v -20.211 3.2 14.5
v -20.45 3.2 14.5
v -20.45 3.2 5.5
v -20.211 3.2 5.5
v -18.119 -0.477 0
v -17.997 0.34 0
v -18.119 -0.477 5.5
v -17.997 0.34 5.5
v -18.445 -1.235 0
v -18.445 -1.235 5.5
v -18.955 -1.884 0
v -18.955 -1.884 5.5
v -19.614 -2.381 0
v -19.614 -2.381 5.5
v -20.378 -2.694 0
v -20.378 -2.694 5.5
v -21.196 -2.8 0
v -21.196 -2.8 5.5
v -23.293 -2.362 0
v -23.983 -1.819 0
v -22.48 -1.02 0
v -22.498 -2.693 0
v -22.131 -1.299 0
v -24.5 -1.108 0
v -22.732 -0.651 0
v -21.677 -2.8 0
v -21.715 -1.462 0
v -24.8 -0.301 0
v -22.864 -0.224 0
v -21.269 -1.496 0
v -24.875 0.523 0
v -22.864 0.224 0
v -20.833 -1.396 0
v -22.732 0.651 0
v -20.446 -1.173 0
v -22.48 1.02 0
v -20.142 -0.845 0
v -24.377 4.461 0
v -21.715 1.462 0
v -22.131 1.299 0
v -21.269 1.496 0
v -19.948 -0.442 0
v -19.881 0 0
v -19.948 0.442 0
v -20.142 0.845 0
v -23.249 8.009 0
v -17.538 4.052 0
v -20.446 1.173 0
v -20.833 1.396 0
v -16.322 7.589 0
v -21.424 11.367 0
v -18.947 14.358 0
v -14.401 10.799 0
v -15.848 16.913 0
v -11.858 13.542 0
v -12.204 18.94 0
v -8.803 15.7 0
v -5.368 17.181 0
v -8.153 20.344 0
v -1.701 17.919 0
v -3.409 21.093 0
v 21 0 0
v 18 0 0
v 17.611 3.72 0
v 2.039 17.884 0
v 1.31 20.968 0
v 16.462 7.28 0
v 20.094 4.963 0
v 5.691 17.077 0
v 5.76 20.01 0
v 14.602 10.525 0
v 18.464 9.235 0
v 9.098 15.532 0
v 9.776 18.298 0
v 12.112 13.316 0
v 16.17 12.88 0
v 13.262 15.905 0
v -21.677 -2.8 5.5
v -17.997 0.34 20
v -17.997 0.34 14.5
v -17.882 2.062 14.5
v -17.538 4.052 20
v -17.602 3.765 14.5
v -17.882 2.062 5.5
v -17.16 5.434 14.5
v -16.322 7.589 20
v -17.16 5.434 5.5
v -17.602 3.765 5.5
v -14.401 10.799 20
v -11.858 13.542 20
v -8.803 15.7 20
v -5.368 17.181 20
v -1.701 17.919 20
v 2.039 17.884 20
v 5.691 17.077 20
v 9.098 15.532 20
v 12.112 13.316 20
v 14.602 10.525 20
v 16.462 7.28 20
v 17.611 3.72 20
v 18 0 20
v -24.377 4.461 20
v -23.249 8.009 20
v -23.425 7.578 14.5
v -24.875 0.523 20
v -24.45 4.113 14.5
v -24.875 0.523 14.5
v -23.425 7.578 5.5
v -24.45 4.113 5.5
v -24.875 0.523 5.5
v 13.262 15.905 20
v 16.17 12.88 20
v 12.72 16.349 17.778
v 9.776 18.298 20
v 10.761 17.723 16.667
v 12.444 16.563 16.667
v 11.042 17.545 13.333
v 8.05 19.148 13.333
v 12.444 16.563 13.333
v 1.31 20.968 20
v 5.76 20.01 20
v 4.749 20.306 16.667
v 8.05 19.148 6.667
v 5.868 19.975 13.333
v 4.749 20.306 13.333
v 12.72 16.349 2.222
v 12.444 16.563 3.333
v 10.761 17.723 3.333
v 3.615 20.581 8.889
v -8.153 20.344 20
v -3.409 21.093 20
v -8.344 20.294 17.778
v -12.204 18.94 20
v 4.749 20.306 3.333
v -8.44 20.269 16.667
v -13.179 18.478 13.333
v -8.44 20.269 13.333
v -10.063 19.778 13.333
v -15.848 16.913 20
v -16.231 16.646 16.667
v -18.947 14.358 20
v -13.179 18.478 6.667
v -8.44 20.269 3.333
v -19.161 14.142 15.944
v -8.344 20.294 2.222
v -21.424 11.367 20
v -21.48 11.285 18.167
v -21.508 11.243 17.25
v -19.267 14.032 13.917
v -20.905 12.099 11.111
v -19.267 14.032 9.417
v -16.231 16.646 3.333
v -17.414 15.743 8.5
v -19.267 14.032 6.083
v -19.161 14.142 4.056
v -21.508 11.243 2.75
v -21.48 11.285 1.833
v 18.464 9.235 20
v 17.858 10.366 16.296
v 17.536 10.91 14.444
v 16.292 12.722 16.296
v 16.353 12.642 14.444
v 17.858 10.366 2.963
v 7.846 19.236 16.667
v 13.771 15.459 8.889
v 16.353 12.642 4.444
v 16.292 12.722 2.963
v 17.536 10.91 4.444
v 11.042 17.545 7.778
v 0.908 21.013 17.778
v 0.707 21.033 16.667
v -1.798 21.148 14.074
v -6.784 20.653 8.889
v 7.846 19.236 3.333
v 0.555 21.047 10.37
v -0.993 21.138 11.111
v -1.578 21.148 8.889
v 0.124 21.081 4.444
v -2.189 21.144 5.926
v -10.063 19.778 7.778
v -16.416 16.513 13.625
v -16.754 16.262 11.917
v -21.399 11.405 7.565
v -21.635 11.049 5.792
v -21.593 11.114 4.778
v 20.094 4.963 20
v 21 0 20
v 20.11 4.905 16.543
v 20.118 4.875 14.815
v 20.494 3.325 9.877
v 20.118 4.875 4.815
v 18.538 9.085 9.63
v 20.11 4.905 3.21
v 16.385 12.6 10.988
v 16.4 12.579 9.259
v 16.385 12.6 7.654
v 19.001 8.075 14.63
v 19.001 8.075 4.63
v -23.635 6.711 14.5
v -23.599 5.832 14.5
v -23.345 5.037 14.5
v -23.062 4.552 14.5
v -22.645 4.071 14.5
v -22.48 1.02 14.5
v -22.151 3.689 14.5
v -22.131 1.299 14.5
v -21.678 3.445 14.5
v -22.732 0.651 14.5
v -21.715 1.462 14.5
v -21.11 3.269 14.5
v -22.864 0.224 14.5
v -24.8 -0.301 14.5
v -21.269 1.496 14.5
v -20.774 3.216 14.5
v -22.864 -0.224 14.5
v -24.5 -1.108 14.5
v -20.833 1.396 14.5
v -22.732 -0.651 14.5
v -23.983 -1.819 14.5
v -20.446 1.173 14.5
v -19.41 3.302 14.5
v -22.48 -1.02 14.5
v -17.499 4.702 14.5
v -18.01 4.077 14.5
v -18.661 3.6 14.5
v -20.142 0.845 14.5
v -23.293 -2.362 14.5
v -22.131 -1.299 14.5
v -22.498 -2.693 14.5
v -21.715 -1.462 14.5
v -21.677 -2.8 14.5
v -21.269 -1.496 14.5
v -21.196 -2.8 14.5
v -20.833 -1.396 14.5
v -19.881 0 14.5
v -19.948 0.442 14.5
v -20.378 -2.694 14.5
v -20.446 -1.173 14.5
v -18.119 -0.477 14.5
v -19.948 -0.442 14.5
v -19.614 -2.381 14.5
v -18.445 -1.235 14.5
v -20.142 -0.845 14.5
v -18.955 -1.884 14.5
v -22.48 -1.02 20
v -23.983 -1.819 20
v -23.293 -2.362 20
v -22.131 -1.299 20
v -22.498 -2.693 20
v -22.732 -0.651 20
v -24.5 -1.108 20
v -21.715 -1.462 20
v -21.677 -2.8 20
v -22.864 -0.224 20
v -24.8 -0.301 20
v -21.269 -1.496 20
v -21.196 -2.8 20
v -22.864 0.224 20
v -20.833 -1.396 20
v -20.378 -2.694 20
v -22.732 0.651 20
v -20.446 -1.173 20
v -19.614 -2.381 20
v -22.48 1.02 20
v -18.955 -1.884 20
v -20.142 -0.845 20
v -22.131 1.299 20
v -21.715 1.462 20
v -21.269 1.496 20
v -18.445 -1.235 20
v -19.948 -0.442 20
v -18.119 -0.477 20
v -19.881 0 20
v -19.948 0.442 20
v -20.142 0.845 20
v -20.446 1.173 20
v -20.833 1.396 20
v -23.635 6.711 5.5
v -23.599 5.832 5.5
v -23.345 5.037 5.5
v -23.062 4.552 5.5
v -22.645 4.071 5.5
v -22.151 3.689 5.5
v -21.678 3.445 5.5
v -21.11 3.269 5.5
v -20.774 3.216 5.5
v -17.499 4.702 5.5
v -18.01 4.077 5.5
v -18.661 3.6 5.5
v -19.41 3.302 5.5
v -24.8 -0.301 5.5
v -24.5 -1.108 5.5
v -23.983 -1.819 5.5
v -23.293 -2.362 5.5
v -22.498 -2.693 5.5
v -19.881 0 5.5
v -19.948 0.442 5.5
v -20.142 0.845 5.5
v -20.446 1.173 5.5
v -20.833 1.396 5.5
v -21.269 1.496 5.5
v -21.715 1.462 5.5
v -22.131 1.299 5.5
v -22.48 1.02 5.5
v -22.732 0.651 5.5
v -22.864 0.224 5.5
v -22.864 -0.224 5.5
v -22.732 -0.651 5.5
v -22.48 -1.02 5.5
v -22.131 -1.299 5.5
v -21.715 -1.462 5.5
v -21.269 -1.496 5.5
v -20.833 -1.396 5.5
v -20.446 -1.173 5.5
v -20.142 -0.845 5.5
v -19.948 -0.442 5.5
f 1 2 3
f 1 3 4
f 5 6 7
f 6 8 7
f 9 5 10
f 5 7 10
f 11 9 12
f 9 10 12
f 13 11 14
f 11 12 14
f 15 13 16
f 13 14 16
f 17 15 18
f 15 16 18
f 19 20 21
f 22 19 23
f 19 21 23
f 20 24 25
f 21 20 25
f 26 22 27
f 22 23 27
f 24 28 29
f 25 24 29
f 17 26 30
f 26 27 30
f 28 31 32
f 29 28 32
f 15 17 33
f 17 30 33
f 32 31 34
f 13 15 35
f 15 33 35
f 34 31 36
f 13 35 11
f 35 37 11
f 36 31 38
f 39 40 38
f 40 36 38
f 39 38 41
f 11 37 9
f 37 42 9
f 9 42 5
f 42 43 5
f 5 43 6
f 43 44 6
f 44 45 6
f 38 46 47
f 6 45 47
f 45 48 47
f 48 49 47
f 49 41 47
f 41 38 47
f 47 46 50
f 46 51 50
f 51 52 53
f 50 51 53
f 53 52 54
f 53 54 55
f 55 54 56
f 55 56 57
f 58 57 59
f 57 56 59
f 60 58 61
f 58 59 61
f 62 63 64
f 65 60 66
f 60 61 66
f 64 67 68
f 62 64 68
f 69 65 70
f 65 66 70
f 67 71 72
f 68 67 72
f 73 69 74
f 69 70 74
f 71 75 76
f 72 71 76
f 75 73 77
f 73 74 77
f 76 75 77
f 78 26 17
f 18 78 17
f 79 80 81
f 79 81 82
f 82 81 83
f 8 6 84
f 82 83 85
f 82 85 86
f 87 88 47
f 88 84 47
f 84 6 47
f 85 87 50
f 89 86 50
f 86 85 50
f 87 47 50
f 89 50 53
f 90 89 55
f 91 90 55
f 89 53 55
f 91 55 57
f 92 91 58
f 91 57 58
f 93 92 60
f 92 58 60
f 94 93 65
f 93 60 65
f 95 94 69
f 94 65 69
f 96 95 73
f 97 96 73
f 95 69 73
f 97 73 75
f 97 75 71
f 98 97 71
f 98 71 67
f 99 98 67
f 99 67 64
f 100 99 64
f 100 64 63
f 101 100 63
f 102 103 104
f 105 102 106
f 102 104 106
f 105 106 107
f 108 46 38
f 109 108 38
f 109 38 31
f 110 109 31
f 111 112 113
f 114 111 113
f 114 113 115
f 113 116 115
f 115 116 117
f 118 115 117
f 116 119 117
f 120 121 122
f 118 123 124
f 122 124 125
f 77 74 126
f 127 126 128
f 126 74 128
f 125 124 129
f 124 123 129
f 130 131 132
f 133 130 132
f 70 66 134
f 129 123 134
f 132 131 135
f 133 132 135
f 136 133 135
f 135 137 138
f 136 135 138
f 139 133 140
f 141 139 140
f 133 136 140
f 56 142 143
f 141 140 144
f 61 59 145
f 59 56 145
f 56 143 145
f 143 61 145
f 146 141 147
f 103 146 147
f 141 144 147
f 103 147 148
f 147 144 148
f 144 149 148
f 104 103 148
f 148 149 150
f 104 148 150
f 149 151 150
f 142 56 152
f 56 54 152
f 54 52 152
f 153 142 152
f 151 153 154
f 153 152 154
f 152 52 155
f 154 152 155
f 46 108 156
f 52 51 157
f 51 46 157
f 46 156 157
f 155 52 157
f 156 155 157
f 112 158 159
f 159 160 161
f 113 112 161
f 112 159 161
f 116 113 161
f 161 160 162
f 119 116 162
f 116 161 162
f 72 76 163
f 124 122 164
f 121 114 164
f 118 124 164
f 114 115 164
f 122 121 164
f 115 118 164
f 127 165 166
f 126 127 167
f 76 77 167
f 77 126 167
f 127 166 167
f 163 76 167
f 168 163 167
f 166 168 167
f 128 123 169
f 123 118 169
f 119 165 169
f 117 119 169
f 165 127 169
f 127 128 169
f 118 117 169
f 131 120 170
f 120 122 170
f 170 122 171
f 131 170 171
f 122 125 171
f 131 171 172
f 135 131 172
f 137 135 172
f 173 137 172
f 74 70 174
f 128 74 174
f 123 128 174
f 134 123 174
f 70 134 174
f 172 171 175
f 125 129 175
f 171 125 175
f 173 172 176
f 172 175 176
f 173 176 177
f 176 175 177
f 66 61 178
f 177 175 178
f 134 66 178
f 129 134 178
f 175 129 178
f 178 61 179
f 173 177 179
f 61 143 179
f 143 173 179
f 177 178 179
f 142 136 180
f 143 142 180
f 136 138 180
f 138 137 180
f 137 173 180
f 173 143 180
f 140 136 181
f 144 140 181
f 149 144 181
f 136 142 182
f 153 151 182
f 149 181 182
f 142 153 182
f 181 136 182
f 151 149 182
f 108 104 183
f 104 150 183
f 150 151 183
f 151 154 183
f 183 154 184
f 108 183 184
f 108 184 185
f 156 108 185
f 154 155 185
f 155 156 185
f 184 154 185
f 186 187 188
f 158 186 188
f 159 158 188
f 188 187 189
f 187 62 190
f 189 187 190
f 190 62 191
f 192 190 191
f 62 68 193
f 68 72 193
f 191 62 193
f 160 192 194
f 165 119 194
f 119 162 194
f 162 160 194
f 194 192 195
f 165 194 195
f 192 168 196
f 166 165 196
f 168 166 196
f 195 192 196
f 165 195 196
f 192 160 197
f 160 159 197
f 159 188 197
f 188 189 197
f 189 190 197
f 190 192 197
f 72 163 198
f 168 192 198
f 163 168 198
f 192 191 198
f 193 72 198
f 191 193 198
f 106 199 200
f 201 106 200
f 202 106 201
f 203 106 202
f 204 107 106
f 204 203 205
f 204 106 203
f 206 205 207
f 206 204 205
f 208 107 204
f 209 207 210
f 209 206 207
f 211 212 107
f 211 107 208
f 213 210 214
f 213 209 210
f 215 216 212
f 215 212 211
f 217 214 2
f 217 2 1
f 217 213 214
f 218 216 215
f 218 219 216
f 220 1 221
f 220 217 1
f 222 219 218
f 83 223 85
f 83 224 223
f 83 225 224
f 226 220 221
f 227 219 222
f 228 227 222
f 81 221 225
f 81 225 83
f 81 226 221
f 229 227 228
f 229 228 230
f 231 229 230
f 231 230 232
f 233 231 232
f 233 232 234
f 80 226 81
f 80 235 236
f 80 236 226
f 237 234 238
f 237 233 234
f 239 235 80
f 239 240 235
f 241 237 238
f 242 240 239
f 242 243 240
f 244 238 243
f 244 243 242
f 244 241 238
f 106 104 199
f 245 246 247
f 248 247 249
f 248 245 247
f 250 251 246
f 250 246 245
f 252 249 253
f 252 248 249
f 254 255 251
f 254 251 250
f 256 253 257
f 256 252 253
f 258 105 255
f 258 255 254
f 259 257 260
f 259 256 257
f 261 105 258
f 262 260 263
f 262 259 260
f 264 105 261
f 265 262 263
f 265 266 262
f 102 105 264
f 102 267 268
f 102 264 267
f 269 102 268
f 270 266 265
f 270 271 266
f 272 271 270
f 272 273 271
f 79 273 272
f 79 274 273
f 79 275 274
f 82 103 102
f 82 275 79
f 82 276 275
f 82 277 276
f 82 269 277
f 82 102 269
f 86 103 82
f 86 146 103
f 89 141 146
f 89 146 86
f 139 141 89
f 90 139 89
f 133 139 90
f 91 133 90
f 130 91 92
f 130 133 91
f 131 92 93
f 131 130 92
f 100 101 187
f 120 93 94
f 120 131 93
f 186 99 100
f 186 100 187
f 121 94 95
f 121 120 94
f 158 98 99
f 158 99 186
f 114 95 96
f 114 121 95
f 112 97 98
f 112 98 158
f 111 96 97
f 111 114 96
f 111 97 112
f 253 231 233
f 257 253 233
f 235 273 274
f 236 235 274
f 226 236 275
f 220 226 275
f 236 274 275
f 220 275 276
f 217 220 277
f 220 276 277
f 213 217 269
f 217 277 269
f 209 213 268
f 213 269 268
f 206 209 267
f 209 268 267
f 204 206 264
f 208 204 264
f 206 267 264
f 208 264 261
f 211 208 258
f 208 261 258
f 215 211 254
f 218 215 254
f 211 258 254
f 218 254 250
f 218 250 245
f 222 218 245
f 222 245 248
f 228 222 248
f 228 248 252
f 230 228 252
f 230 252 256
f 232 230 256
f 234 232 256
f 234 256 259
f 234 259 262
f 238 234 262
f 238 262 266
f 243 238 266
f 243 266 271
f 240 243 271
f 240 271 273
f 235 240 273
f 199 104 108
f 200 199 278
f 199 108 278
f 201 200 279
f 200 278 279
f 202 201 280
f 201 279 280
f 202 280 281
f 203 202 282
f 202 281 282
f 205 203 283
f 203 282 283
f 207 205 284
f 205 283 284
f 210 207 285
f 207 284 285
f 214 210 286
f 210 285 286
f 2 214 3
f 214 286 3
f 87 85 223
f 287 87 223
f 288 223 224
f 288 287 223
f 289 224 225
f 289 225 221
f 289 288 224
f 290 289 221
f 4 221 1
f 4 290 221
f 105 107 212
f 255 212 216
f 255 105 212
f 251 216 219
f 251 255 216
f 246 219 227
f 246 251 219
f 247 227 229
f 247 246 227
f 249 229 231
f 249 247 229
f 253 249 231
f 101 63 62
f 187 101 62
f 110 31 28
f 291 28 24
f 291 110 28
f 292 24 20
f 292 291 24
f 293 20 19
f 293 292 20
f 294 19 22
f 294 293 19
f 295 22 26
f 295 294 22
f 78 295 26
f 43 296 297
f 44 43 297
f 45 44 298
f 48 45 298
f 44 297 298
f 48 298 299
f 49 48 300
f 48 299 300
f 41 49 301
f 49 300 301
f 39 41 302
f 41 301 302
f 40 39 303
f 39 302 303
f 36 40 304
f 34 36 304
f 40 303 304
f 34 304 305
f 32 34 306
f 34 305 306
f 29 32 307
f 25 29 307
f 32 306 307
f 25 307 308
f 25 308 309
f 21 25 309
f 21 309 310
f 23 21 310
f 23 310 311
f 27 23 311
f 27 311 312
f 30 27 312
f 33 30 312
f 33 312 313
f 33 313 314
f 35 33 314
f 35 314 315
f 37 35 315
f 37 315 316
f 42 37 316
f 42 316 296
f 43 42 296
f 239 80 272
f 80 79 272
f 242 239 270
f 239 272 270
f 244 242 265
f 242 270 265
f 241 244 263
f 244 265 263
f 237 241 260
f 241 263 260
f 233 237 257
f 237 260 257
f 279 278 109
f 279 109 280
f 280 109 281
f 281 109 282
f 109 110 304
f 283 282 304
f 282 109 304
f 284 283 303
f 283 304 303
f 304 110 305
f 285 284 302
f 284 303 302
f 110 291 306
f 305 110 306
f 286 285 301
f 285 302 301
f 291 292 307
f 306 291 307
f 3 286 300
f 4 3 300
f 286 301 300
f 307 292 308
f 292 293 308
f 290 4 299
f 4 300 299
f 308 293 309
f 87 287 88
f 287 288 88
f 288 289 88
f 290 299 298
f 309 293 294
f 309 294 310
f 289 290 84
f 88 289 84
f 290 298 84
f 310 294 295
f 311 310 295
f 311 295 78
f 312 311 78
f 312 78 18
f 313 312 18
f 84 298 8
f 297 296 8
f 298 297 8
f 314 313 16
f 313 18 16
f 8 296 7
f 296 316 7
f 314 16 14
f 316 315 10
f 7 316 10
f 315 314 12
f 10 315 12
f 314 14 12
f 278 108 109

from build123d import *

# Parameters (mm, degrees)
PAD_DEPTH       = 20
SKETCH005_R     = 1.5
POCKET_DEPTH    = 20.001
SKETCH008_W     = 19.422657
SKETCH008_H     = 9
POCKET002_DEPTH = 6
FILLET002_R     = 3.2


with BuildPart() as part:
    # Sketch → Pad (new body)
    with BuildSketch(Plane.XY):
        with BuildLine():
            Line((18, 0), (21, 0))
            add(Edge.make_bspline(
                [(21, 0), (18.005676, 31.142447), (-27.438789, 25.917835), (-24.780889, -2.8)],
                knots=[0, 0, 0, 0, 1, 1, 1, 1], degree=3))
            Line((-24.780889, -2.8), (-17.780889, -2.8))
            ThreePointArc((-17.780889, -2.8), (-1.40428, 17.945139), (18, 0))
        make_face()
    extrude(amount=PAD_DEPTH)

    # Sketch005 (on Face6 of Pad) → Pocket (cut, through all)
    with BuildSketch(Plane.XY.offset(20)):
        with Locations((-21.380889, 0)):
            Circle(SKETCH005_R)
    extrude(amount=-POCKET_DEPTH, mode=Mode.SUBTRACT)

    # Sketch008 (on Face6 of Pocket) → Pocket002 (cut)
    with BuildSketch(Plane.XZ.offset(2.8)):
        with Locations((-21.679914, 10)):
            Rectangle(SKETCH008_W, SKETCH008_H)
    extrude(amount=-POCKET002_DEPTH, mode=Mode.SUBTRACT)

    # Fillet002
    fillet002_edges = [part.edges().sort_by_distance(p)[0] for p in [
        (-17.713272, 3.2, 10),
        (-24.614915, 3.2, 10),
        (-24.780889, -2.8, 2.75),
        (-17.780889, -2.8, 2.75),
        (-17.780889, -2.8, 17.25),
        (-24.780889, -2.8, 17.25),
    ]]
    fillet(fillet002_edges, radius=FILLET002_R)


solid = part.part
